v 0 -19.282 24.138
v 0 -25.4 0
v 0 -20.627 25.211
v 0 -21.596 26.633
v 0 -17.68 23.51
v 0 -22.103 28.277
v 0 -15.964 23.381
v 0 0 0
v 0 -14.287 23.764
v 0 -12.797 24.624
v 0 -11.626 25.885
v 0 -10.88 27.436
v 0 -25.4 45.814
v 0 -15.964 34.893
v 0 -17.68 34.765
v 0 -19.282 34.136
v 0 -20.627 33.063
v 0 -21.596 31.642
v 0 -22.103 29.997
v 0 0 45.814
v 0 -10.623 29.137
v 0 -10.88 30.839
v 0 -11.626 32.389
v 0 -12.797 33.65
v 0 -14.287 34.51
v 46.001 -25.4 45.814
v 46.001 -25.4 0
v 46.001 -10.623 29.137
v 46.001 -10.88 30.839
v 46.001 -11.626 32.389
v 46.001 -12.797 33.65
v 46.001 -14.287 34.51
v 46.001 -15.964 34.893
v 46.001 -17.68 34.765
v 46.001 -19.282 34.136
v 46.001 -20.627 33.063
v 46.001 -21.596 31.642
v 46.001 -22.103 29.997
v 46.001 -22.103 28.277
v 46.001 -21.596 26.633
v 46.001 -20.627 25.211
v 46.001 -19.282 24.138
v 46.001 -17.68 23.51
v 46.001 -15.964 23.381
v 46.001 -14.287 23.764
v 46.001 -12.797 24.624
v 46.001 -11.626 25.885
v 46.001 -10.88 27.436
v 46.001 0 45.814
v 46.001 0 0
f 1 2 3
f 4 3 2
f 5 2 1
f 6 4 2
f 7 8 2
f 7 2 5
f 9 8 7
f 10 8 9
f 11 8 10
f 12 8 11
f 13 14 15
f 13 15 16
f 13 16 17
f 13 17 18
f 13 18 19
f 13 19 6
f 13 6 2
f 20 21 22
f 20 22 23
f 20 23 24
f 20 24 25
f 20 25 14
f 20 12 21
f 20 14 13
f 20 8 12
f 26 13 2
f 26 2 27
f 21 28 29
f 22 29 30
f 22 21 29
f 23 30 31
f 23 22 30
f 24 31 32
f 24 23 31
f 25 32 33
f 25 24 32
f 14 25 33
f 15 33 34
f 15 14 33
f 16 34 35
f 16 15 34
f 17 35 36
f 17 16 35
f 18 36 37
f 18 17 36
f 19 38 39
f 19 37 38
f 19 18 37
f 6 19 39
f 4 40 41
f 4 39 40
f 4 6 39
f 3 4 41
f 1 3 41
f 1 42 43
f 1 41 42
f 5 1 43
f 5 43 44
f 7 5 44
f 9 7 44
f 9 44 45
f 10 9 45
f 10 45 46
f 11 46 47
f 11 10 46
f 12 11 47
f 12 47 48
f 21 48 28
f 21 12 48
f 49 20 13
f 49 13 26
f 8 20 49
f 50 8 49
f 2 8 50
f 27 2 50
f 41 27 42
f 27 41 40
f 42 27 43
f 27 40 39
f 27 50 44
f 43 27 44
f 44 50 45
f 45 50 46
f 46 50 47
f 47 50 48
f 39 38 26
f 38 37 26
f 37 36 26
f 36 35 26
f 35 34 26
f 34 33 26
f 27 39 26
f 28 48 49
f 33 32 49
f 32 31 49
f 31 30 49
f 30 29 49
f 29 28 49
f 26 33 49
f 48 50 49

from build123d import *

# Parameters (mm, degrees)
F0_W     = 46.001066
F0_H     = 45.813687
F1_DEPTH = 25.4
F2_R     = 5.772308
F3_DEPTH = 46.002066


with BuildPart() as f1:
    # F0 (on Front) → F1 (new body)
    with BuildSketch(Plane.XZ):
        with Locations((23.000533, 22.906843)):
            Rectangle(F0_W, F0_H)
    extrude(amount=F1_DEPTH)

    # F2 (on Right) → F3 (cut, through all)
    with BuildSketch(Plane.YZ):
        with Locations((-16.395491, 29.137131)):
            Circle(F2_R)
    extrude(amount=F3_DEPTH, mode=Mode.SUBTRACT)


solid = f1.part
